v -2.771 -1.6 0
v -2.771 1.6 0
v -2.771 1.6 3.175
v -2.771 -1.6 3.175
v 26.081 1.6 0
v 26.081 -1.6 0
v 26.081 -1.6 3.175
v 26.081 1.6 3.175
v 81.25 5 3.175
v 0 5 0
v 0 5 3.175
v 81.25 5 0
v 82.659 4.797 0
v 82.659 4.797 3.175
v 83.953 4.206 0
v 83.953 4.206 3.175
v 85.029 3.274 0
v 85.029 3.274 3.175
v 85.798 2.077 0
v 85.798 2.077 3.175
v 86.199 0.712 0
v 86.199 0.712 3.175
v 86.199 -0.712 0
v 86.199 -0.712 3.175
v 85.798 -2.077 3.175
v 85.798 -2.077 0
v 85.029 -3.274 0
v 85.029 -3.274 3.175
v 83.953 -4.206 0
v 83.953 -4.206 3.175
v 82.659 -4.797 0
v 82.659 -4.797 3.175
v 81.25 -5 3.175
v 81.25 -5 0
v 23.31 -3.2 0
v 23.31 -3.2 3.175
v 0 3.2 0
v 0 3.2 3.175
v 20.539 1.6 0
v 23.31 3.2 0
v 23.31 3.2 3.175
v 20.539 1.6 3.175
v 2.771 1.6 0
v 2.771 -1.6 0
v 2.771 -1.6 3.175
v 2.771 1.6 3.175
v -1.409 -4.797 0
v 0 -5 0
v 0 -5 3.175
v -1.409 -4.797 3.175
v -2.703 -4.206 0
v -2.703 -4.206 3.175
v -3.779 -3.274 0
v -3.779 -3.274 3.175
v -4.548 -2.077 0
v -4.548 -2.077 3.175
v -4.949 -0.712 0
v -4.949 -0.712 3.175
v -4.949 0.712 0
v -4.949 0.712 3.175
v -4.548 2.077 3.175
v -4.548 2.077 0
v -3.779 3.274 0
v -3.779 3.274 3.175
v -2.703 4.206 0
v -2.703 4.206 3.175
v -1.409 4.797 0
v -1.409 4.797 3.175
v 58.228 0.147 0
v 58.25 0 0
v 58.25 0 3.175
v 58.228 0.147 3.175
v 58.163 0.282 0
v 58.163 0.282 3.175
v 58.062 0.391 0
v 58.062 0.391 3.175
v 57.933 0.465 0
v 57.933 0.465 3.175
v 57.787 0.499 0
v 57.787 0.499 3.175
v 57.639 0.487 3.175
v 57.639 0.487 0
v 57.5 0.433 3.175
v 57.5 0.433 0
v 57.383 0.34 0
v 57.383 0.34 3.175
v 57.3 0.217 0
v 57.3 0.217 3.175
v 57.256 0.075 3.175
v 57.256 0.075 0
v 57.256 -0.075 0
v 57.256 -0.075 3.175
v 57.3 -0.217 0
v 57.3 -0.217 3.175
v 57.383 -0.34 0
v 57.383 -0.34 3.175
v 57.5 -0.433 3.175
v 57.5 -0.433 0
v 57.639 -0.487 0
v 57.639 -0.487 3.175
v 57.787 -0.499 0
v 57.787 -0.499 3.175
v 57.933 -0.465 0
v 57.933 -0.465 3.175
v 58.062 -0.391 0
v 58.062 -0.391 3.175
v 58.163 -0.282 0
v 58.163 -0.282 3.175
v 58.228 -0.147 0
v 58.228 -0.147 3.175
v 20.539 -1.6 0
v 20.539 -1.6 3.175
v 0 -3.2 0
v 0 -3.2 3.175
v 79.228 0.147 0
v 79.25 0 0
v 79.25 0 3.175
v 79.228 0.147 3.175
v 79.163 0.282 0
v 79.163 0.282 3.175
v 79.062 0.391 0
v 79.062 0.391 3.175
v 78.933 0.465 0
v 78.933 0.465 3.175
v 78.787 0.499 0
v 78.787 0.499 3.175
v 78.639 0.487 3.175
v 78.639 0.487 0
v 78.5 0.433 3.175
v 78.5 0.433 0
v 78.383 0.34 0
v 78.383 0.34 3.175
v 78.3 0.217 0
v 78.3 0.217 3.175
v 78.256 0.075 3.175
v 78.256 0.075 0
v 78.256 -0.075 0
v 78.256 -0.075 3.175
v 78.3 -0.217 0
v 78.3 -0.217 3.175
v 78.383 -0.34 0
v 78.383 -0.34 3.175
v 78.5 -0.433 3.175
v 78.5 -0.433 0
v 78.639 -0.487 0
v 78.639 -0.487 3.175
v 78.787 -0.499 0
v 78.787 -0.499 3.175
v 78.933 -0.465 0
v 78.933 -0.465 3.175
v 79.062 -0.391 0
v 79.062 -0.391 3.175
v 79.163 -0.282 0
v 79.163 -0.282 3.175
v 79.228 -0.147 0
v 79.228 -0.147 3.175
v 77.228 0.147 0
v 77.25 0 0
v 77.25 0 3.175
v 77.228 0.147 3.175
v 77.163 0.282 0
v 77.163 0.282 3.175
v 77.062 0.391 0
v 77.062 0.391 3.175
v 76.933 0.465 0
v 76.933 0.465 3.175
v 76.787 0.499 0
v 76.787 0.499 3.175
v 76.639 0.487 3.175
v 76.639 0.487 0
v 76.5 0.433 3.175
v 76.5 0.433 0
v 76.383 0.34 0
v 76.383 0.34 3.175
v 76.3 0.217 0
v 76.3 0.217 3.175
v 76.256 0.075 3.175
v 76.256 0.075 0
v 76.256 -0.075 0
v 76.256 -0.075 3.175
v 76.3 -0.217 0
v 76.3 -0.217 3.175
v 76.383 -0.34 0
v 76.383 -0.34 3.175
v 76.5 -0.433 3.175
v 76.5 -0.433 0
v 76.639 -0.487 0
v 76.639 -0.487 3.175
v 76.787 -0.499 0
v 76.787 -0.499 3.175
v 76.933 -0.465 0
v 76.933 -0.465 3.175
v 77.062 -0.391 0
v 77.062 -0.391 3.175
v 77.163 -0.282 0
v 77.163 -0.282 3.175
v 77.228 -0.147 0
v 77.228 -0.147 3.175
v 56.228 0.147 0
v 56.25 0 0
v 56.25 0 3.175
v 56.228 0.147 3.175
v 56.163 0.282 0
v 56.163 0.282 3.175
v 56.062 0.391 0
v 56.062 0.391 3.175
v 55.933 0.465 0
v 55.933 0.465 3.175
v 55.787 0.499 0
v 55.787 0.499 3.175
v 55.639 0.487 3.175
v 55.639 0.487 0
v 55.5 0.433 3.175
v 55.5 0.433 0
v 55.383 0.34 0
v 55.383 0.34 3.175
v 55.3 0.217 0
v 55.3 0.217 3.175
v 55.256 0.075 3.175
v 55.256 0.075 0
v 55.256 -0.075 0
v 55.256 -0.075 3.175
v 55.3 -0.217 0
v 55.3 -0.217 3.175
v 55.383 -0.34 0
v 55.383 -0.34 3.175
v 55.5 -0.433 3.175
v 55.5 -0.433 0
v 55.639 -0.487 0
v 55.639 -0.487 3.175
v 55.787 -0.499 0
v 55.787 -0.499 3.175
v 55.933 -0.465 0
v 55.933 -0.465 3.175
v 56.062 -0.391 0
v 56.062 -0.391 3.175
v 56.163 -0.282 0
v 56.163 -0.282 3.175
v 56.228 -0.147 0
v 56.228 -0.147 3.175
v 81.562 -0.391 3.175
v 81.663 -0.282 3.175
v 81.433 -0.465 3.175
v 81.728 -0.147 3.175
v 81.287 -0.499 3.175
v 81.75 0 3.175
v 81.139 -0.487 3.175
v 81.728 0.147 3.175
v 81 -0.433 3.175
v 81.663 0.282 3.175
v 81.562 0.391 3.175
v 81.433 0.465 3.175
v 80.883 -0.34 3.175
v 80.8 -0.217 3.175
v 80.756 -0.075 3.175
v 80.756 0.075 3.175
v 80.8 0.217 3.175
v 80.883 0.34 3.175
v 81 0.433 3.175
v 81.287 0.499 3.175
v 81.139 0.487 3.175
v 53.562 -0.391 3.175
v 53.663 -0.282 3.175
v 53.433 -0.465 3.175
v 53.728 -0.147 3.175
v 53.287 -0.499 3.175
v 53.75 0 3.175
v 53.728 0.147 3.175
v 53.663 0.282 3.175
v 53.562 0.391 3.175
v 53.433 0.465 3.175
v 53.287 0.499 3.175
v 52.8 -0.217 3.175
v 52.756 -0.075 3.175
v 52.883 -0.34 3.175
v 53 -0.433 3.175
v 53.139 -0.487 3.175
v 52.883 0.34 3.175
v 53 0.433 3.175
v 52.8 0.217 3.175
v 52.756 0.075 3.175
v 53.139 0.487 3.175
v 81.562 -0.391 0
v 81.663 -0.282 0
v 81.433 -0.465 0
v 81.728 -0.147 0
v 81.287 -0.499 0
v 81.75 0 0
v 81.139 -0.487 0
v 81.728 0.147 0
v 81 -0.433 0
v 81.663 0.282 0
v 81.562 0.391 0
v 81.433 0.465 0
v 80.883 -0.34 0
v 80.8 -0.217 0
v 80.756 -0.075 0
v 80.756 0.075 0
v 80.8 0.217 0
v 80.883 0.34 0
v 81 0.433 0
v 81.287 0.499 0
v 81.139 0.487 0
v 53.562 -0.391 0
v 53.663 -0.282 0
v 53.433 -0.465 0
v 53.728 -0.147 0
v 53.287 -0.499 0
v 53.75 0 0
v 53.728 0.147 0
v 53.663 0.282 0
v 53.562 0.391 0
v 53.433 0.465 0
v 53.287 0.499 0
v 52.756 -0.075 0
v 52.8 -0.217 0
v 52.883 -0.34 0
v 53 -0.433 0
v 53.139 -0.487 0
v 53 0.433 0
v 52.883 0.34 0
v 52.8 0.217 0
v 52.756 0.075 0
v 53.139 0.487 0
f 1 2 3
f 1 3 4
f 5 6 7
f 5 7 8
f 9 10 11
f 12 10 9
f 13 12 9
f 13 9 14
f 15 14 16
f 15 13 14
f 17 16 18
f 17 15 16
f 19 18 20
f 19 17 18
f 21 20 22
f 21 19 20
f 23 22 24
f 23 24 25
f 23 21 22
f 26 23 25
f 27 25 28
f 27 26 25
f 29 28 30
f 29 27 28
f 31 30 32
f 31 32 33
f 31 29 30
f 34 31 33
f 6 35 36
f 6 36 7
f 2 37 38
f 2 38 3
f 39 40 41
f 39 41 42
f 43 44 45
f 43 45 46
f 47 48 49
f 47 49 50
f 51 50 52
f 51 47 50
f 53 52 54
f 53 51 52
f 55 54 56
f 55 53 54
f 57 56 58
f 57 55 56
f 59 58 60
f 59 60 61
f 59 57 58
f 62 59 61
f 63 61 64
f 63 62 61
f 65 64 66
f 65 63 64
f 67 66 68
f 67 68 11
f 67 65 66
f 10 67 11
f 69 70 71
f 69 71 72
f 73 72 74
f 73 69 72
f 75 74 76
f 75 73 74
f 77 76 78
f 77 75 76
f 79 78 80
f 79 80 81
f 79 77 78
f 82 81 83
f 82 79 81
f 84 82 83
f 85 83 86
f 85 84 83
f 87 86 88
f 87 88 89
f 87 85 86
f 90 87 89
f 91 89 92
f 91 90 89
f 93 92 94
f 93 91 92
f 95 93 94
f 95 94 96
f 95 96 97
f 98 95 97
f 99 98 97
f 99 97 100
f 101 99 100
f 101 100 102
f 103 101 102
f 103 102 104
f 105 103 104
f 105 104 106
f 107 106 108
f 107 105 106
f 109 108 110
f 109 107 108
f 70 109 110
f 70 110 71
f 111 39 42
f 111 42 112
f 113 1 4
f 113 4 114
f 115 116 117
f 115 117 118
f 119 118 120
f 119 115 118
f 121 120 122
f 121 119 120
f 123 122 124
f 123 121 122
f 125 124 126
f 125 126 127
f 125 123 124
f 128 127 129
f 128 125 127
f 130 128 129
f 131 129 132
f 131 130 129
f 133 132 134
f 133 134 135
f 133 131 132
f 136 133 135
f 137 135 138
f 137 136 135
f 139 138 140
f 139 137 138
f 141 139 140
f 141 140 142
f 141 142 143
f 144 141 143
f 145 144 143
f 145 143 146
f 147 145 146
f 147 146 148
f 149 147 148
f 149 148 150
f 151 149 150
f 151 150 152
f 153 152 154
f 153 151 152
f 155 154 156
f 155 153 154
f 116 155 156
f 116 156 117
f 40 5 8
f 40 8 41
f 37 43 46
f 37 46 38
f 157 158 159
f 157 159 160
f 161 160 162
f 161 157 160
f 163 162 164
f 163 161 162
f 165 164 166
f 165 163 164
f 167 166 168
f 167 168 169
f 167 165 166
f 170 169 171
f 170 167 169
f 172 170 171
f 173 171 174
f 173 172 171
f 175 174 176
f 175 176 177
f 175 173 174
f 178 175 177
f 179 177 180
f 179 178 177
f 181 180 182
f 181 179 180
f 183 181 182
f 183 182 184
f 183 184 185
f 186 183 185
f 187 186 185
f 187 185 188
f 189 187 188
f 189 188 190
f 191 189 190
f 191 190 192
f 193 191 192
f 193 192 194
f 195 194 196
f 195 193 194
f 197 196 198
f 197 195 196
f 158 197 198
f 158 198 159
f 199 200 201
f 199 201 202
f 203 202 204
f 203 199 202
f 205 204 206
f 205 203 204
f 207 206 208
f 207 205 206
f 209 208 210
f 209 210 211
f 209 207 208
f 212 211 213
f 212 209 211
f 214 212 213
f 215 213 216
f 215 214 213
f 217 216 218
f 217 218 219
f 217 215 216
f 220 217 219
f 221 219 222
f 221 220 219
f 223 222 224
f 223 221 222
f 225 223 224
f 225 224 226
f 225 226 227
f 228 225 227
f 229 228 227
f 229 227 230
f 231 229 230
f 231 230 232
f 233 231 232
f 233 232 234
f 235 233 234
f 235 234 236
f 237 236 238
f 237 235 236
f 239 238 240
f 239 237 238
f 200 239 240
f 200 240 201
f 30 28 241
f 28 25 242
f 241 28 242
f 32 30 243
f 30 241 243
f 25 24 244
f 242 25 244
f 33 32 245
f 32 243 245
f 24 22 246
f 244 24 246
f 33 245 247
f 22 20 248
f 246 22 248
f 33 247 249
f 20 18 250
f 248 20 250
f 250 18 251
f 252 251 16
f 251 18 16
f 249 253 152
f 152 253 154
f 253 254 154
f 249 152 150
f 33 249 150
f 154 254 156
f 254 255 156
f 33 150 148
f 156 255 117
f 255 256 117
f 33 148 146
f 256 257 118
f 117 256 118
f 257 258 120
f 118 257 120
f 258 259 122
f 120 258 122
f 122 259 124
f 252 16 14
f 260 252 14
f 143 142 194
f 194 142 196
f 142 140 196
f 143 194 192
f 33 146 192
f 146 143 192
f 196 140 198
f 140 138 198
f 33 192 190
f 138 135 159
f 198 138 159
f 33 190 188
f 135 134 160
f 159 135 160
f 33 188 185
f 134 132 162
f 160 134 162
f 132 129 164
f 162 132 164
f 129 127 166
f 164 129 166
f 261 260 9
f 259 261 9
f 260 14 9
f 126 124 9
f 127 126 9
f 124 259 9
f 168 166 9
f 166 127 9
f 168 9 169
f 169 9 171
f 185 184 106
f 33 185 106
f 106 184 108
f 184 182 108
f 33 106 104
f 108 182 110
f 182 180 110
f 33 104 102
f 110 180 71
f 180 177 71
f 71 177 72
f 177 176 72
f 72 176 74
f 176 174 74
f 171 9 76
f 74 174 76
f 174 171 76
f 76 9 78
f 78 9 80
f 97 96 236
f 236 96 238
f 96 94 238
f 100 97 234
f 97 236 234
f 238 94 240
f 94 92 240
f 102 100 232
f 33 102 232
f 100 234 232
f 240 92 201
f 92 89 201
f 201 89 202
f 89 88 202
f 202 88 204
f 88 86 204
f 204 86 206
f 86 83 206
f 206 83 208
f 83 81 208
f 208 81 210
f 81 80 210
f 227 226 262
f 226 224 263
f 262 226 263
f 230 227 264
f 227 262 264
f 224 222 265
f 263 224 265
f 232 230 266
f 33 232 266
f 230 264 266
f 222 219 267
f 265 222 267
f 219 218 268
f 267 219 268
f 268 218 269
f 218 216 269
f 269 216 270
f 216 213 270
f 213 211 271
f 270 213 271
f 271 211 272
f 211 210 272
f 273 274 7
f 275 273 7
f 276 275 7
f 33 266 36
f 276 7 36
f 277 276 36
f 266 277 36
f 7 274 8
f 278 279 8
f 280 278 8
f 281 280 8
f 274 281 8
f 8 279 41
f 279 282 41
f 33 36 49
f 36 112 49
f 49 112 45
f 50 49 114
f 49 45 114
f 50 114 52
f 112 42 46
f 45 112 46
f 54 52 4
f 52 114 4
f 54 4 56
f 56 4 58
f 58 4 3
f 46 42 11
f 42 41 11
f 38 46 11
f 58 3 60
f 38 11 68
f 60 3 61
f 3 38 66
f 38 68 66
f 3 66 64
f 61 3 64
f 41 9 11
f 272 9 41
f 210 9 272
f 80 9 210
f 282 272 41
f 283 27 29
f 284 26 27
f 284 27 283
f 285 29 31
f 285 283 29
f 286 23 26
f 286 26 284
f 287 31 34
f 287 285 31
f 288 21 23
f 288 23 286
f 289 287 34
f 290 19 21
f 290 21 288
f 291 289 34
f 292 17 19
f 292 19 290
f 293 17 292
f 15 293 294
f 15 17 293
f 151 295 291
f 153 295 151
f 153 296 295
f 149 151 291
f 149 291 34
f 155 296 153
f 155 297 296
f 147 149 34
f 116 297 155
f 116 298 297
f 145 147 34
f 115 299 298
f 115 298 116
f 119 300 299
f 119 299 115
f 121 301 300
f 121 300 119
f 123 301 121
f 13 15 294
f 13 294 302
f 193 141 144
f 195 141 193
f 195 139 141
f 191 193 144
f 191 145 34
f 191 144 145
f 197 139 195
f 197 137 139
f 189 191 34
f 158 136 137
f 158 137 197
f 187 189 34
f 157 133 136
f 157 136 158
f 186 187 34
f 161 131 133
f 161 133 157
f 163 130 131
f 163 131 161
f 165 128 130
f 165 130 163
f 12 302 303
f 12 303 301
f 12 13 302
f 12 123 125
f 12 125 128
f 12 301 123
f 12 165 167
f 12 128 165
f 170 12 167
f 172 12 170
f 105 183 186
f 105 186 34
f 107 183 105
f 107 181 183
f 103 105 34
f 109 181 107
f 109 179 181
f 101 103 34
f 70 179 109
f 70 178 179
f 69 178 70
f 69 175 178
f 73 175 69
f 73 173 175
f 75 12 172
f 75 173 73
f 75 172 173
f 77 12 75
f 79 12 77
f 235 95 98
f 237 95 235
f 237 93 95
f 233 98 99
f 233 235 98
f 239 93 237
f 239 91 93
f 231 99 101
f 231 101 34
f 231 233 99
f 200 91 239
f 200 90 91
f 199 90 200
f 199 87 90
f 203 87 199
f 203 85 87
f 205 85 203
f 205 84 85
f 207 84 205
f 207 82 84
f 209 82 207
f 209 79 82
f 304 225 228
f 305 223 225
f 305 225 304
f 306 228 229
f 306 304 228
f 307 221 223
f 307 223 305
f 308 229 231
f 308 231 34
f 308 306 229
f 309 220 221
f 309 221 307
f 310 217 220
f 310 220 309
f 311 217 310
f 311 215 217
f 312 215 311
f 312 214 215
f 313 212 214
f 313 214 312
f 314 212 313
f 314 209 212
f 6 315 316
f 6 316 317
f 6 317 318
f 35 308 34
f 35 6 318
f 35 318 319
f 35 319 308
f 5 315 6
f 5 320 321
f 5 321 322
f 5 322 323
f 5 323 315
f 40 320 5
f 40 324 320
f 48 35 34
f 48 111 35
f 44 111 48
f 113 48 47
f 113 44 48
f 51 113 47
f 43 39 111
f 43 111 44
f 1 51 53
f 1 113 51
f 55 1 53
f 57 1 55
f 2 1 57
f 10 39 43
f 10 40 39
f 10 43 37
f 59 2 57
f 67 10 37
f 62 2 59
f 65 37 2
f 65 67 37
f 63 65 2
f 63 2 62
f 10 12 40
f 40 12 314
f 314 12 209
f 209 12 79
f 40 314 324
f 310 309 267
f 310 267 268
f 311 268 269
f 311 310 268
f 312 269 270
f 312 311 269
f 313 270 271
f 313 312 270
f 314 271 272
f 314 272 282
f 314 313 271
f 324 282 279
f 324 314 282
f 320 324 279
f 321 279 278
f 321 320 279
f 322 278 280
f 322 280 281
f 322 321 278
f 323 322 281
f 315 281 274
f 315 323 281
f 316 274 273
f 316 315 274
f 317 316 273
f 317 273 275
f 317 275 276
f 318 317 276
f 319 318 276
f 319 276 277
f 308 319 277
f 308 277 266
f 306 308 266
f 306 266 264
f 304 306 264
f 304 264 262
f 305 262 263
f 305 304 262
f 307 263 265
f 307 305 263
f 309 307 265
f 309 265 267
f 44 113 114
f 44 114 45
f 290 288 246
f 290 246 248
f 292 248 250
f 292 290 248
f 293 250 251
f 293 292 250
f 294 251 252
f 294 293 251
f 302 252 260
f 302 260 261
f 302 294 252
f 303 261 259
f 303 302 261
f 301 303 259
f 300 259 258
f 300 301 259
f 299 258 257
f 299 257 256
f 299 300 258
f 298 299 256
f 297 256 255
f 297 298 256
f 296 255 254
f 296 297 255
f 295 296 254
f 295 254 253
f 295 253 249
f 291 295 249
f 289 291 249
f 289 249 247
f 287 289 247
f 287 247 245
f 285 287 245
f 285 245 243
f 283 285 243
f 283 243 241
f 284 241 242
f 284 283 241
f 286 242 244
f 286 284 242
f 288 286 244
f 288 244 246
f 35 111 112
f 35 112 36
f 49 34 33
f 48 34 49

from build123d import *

# Parameters (mm, degrees)
SKETCH1_R           = 0.5
BOSS_EXTRUDE1_DEPTH = 3.175


with BuildPart() as part:
    # Sketch1 → Boss-Extrude1 (new body)
    with BuildSketch(Plane.XY):
        with BuildLine():
            Line((0, 5), (81.25, 5))
            ThreePointArc((81.25, 5), (86.25, 0), (81.25, -5))
            Line((81.25, -5), (0, -5))
            ThreePointArc((0, -5), (-5, 0), (0, 5))
        make_face()
        with Locations((81.25, 0)):
            Circle(SKETCH1_R, mode=Mode.SUBTRACT)
        with Locations((53.25, 0)):
            Circle(SKETCH1_R, mode=Mode.SUBTRACT)
        with Locations((55.75, 0)):
            Circle(SKETCH1_R, mode=Mode.SUBTRACT)
        with Locations((57.75, 0)):
            Circle(SKETCH1_R, mode=Mode.SUBTRACT)
        with Locations((78.75, 0)):
            Circle(SKETCH1_R, mode=Mode.SUBTRACT)
        with Locations((76.75, 0)):
            Circle(SKETCH1_R, mode=Mode.SUBTRACT)
        Polygon((0, 3.2), (-2.771281292, 1.6), (-2.771281292, -1.6), (0, -3.2), (2.771281292, -1.6), (2.771281292, 1.6), align=None, mode=Mode.SUBTRACT)
        Polygon((26.081281292, 1.6), (23.31, 3.2), (20.538718708, 1.6), (20.538718708, -1.6), (23.31, -3.2), (26.081281292, -1.6), align=None, mode=Mode.SUBTRACT)
    extrude(amount=BOSS_EXTRUDE1_DEPTH)


solid = part.part
